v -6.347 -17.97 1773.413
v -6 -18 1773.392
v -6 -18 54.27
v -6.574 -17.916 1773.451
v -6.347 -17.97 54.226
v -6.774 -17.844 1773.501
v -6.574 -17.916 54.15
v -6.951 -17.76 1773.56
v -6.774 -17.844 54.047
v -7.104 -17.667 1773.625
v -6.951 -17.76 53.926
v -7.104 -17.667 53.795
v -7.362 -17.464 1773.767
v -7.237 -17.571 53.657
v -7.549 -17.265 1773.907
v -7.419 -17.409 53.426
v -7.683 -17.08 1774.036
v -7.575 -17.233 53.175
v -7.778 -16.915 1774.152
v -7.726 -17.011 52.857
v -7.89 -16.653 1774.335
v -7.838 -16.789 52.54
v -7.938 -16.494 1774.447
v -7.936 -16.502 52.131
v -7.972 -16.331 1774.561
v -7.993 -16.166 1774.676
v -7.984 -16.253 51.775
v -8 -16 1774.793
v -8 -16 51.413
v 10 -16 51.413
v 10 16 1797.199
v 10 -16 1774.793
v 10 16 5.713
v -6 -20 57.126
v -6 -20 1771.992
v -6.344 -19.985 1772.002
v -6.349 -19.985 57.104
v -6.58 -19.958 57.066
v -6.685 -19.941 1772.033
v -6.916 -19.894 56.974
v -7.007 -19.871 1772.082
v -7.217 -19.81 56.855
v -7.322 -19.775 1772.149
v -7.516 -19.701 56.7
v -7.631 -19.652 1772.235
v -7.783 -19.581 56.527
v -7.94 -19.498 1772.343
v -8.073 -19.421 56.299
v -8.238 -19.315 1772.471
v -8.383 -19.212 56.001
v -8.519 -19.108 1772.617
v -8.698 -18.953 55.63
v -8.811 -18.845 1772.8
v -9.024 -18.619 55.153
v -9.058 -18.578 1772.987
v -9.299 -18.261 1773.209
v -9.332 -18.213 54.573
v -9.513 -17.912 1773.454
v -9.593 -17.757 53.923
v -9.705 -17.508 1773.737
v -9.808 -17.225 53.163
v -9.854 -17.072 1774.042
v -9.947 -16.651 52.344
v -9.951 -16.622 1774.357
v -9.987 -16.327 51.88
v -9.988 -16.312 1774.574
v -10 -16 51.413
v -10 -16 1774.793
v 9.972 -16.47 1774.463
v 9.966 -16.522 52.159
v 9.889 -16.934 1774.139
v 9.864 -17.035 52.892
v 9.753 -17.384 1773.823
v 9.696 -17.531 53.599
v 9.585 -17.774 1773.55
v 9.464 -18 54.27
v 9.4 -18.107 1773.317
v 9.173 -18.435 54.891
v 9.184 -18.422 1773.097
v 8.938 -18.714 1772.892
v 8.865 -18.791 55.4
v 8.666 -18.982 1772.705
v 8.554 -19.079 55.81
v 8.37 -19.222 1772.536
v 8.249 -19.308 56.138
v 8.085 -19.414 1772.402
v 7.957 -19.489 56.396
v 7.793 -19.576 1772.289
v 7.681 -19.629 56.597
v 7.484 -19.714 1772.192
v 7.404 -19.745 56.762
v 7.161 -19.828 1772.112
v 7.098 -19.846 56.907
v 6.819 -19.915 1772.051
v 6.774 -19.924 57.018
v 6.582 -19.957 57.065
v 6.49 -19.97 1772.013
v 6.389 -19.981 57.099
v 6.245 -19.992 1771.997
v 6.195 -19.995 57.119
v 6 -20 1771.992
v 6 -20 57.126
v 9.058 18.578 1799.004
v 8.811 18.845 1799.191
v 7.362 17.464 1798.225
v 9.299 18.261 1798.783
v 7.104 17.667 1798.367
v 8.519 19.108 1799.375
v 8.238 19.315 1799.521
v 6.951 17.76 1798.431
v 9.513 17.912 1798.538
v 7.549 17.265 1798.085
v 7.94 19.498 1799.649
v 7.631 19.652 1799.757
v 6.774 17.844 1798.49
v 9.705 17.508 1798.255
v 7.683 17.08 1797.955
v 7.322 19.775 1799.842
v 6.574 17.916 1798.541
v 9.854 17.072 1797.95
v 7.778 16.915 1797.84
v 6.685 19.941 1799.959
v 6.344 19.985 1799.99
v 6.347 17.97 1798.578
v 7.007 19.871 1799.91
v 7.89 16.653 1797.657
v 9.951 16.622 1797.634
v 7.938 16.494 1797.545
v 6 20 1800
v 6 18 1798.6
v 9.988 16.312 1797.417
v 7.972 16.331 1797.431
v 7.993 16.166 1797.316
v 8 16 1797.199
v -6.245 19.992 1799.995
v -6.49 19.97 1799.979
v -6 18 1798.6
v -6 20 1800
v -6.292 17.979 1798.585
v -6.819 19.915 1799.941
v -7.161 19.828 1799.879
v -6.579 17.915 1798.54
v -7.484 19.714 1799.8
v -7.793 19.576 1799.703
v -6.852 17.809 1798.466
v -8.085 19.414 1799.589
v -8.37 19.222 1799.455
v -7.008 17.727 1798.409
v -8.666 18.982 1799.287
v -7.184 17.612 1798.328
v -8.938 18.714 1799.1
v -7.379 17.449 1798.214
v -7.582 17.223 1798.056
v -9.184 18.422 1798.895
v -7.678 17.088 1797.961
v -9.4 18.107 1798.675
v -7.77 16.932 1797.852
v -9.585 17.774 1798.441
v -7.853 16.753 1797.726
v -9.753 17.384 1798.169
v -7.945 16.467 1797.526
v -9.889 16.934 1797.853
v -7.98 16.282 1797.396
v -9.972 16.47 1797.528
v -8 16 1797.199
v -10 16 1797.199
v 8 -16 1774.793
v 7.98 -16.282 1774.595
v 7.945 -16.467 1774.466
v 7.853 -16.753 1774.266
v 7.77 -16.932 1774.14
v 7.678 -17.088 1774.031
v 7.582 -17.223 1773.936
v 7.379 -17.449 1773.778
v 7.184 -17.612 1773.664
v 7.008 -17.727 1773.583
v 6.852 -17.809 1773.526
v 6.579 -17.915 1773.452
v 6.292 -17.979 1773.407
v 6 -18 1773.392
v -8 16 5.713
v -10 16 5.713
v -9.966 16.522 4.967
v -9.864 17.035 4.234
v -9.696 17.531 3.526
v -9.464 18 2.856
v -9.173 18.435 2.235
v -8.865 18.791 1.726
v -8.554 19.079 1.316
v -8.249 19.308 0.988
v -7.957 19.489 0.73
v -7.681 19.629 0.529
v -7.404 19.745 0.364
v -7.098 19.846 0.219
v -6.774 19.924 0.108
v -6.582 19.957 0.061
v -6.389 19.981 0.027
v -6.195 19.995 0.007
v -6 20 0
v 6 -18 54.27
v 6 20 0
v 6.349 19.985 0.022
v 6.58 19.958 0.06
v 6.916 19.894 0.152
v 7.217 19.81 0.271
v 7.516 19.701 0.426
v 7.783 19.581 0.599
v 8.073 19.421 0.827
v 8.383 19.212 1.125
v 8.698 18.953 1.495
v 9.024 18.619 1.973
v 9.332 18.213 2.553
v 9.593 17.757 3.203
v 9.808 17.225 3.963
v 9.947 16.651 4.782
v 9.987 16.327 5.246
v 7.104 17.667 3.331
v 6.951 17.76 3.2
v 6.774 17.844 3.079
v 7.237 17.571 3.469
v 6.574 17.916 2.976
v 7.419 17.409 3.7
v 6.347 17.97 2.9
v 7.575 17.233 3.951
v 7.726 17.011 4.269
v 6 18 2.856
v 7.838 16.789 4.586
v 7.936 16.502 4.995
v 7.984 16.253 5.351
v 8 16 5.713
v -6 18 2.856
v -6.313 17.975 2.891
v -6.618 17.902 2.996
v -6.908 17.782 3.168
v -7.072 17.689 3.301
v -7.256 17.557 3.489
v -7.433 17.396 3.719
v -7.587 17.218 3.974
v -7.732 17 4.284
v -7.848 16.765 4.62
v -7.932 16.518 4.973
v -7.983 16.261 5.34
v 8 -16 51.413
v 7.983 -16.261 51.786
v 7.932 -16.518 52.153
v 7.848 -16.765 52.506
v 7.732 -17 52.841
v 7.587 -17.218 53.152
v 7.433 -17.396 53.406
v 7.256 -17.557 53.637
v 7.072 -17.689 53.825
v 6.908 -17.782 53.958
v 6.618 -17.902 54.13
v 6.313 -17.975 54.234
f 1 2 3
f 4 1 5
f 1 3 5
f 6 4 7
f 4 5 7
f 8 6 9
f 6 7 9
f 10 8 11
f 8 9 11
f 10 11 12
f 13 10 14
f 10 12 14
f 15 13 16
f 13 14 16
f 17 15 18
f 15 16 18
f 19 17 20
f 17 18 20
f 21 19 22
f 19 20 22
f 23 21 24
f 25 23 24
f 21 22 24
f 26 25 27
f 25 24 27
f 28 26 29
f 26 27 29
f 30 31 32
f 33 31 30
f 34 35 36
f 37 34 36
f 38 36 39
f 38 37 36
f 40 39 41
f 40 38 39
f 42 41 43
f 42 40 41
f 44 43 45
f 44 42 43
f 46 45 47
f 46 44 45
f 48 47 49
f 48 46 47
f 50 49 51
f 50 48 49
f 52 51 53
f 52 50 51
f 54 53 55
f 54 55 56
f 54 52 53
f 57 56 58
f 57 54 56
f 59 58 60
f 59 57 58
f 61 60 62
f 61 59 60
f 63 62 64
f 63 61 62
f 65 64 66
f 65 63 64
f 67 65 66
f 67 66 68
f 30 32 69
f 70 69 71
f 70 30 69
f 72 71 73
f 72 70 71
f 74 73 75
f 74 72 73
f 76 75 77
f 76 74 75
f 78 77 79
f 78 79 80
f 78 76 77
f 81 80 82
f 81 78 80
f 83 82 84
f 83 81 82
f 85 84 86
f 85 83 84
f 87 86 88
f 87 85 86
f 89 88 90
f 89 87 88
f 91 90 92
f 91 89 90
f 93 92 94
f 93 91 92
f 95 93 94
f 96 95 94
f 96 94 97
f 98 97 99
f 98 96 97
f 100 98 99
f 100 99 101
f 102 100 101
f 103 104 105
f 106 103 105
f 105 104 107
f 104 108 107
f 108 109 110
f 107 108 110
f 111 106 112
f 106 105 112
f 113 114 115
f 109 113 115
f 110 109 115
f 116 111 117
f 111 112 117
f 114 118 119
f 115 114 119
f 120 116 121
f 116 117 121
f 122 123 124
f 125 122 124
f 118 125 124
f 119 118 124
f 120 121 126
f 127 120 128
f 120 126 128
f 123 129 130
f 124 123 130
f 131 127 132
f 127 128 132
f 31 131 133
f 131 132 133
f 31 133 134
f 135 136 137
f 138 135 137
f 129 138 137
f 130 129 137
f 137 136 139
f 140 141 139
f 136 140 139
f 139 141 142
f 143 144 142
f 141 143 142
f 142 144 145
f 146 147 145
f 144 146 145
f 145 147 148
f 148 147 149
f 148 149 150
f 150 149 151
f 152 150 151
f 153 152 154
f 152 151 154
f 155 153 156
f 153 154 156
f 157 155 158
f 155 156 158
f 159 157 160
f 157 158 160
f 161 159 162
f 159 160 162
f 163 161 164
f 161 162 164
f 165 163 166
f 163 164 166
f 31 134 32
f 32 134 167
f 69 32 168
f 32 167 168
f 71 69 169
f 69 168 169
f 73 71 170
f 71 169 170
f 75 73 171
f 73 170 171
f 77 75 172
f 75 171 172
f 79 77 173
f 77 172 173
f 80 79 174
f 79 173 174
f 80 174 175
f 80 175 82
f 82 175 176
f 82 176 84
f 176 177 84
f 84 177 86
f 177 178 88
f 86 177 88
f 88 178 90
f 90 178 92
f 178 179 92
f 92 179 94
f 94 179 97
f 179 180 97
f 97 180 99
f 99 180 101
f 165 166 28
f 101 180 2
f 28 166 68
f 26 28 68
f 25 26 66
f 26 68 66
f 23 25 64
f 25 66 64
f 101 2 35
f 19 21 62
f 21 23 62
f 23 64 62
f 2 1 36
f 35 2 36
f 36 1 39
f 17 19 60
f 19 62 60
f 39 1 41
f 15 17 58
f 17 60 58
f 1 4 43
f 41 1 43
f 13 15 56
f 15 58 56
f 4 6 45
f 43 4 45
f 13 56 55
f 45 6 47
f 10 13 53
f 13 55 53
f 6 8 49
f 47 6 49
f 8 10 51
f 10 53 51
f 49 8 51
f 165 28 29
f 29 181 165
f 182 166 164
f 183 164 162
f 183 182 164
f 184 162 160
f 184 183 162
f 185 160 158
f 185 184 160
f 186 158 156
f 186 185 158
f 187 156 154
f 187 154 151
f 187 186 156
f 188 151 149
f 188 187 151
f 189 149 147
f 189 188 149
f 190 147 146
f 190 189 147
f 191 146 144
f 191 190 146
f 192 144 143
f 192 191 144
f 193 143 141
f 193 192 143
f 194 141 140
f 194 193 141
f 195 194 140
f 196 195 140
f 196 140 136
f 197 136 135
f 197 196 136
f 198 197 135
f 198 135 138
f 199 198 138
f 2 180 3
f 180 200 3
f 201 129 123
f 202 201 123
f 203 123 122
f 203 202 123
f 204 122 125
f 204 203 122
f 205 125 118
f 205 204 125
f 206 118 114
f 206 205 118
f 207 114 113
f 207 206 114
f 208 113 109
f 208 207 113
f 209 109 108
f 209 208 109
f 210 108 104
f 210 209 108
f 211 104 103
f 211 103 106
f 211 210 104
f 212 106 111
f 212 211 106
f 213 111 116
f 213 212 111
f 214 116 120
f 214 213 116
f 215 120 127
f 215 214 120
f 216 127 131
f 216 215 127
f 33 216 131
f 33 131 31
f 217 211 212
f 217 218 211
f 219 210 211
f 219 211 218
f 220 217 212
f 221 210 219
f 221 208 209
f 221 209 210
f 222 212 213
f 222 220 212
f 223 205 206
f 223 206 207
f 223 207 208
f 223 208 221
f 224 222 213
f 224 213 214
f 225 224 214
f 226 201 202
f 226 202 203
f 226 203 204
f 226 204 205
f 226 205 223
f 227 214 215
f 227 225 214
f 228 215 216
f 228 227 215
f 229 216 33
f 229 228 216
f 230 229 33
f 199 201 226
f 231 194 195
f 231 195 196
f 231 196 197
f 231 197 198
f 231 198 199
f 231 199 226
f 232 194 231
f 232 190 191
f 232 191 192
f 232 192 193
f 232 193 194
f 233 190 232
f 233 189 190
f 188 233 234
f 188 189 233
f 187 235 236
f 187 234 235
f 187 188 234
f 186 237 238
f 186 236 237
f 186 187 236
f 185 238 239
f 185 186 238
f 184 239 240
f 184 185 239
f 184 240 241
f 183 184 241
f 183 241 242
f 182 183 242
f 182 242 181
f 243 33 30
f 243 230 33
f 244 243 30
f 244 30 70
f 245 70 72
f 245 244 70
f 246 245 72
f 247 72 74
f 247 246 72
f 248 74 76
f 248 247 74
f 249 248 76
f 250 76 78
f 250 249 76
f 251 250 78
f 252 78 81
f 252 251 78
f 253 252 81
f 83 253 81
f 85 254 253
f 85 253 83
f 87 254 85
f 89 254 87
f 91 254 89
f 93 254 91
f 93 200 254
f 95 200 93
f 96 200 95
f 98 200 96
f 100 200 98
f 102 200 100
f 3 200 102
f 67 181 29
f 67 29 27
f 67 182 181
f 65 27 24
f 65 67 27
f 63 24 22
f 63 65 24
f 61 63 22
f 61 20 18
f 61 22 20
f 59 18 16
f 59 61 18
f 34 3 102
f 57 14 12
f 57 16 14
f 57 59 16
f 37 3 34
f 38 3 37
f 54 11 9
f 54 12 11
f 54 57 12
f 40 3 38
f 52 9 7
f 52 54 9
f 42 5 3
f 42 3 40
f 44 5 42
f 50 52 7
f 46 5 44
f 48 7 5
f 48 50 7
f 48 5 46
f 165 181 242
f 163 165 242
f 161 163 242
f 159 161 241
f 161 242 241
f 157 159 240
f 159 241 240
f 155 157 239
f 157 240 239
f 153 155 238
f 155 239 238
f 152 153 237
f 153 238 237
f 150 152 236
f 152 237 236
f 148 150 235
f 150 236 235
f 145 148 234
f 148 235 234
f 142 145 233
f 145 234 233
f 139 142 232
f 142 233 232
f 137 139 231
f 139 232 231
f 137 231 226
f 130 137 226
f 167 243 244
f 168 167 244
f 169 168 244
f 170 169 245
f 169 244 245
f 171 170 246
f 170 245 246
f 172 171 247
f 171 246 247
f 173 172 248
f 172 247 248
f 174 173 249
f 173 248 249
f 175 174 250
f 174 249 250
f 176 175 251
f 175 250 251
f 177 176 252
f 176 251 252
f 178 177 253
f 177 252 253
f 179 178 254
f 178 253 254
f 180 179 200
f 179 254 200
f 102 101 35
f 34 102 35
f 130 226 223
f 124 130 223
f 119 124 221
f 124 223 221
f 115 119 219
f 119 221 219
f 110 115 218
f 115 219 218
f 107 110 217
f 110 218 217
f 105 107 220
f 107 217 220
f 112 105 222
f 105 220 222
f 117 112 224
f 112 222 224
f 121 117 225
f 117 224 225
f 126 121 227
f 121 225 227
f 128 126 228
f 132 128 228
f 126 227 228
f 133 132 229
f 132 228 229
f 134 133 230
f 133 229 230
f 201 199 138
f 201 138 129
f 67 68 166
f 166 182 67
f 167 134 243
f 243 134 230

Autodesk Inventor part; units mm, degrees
ref_plane "YZ Plane" through (0, 0, 0) normal (1, 0, 0) x (0, 1, 0)
ref_plane "Start plane" through (0, 0, 0) normal (0, 0, 1) x (1, 0, 0)
ref_plane "End plane" through (0, 0, 1800) normal (0, 0, 1) x (1, 0, 0)
sketch "Sketch" plane through (0, 0, 0) normal (0, 0, 1) x (1, 0, 0)
  line L0 (-10, -16) -> (-10, 16)
  line L1 (-6, 20) -> (6, 20)
  line L2 (10, 16) -> (10, -16)
  line L3 (6, -20) -> (-6, -20)
  arc A0 (-10, -16) -> (-6, -20) centre (-6, -16) ccw
  arc A1 (10, 16) -> (6, 20) centre (6, 16) ccw
  arc A2 (-6, 20) -> (-10, 16) centre (-6, 16) ccw
  arc A3 (6, -20) -> (10, -16) centre (6, -16) ccw
  arc A4 (-6, 18) -> (-8, 16) centre (-6, 16) ccw
  line L4 (-6, 18) -> (6, 18)
  arc A5 (8, 16) -> (6, 18) centre (6, 16) ccw
  line L5 (8, 16) -> (8, -16)
  arc A6 (6, -18) -> (8, -16) centre (6, -16) ccw
  line L6 (6, -18) -> (-6, -18)
  arc A7 (-8, -16) -> (-6, -18) centre (-6, -16) ccw
  line L7 (-8, -16) -> (-8, 16)
  line L8 (0, 37.1021) -> (0, -37.1021) construction
  line L9 (-23.1021, 0) -> (23.1021, 0) construction
  dimension "d7" = 4
  dimension "d9" = 20
  dimension "d11" = 40
  dimension "d12" = 2
  dimension "d15" = 10
  dimension "d16" = 20
extrude "Body" add sketch "Sketch" along normal up to surface (1800 mm away) from surface at 0
sketch "Sketch3" plane through (0, 0, 0) normal (0, 0, 1) x (1, 0, 0)
  line L0 (0, 0) -> (10, 0)
ref_plane "Work Plane3" through (0, 0, 0) normal (0, -1, 0) x (1, 0, 0)
sketch "Sketch5" plane through (0, 0, 0) normal (1, 0, 0) x (0, 1, 0)
  line L0 (-20, 0) -> (-20, 1800) projected
  line L1 (-20, 0) -> (-20, 1800) projected
  line L2 (20, 0) -> (20, 1800) projected
  line L3 (20, 0) -> (20, 1800) projected
  line L4 (-20, 0) -> (20, 0)
  line L5 (-20, 1800) -> (20, 1800)
  line L6 (20, 1800) -> (-20, 1771.9917)
  line L7 (20, 0) -> (-20, 57.1259)
  line L8 (-20, 0) -> (-20, 1800) projected
  point P0 (0, 0)
  dimension "d19" = 55
  dimension "d20" = 35
extrude "Extrusion2" cut sketch "Sketch5" along normal through all both and the other way through all contours L0 L7 L4 | L0 L5 L6
sketch "Sketch4" plane through (0, 0, 0) normal (0, -1, 0) x (1, 0, 0)
  line L0 (-2, 0) -> (12, 0) projected
  line L1 (-2, 1800) -> (12, 1800) projected
  dimension "d18" = 1800
equation "\"d7\" = G_IR"
equation "\"d9\" = G_W"
equation "\"d11\" = G_H"
equation "\"d12\" = G_T"
equation "\"d15\" = 0.5 * d9"
equation "\"d16\" = 0.5 * d11"
equation "\"d3\" = G_L"
equation "\"G_W\" = 20"
equation "\"G_H\" = 40"
equation "\"G_T\" = 2"
equation "\"G_IR\" = 4"
equation "\"G_L\" = d18"
equation "\"G_OFFSET_START\" = 0"
equation "\"G_OFFSET_END\" = 0"
properties part number "ISO 4019 - 40x20x2 - 1800" material "Stainless Steel"
